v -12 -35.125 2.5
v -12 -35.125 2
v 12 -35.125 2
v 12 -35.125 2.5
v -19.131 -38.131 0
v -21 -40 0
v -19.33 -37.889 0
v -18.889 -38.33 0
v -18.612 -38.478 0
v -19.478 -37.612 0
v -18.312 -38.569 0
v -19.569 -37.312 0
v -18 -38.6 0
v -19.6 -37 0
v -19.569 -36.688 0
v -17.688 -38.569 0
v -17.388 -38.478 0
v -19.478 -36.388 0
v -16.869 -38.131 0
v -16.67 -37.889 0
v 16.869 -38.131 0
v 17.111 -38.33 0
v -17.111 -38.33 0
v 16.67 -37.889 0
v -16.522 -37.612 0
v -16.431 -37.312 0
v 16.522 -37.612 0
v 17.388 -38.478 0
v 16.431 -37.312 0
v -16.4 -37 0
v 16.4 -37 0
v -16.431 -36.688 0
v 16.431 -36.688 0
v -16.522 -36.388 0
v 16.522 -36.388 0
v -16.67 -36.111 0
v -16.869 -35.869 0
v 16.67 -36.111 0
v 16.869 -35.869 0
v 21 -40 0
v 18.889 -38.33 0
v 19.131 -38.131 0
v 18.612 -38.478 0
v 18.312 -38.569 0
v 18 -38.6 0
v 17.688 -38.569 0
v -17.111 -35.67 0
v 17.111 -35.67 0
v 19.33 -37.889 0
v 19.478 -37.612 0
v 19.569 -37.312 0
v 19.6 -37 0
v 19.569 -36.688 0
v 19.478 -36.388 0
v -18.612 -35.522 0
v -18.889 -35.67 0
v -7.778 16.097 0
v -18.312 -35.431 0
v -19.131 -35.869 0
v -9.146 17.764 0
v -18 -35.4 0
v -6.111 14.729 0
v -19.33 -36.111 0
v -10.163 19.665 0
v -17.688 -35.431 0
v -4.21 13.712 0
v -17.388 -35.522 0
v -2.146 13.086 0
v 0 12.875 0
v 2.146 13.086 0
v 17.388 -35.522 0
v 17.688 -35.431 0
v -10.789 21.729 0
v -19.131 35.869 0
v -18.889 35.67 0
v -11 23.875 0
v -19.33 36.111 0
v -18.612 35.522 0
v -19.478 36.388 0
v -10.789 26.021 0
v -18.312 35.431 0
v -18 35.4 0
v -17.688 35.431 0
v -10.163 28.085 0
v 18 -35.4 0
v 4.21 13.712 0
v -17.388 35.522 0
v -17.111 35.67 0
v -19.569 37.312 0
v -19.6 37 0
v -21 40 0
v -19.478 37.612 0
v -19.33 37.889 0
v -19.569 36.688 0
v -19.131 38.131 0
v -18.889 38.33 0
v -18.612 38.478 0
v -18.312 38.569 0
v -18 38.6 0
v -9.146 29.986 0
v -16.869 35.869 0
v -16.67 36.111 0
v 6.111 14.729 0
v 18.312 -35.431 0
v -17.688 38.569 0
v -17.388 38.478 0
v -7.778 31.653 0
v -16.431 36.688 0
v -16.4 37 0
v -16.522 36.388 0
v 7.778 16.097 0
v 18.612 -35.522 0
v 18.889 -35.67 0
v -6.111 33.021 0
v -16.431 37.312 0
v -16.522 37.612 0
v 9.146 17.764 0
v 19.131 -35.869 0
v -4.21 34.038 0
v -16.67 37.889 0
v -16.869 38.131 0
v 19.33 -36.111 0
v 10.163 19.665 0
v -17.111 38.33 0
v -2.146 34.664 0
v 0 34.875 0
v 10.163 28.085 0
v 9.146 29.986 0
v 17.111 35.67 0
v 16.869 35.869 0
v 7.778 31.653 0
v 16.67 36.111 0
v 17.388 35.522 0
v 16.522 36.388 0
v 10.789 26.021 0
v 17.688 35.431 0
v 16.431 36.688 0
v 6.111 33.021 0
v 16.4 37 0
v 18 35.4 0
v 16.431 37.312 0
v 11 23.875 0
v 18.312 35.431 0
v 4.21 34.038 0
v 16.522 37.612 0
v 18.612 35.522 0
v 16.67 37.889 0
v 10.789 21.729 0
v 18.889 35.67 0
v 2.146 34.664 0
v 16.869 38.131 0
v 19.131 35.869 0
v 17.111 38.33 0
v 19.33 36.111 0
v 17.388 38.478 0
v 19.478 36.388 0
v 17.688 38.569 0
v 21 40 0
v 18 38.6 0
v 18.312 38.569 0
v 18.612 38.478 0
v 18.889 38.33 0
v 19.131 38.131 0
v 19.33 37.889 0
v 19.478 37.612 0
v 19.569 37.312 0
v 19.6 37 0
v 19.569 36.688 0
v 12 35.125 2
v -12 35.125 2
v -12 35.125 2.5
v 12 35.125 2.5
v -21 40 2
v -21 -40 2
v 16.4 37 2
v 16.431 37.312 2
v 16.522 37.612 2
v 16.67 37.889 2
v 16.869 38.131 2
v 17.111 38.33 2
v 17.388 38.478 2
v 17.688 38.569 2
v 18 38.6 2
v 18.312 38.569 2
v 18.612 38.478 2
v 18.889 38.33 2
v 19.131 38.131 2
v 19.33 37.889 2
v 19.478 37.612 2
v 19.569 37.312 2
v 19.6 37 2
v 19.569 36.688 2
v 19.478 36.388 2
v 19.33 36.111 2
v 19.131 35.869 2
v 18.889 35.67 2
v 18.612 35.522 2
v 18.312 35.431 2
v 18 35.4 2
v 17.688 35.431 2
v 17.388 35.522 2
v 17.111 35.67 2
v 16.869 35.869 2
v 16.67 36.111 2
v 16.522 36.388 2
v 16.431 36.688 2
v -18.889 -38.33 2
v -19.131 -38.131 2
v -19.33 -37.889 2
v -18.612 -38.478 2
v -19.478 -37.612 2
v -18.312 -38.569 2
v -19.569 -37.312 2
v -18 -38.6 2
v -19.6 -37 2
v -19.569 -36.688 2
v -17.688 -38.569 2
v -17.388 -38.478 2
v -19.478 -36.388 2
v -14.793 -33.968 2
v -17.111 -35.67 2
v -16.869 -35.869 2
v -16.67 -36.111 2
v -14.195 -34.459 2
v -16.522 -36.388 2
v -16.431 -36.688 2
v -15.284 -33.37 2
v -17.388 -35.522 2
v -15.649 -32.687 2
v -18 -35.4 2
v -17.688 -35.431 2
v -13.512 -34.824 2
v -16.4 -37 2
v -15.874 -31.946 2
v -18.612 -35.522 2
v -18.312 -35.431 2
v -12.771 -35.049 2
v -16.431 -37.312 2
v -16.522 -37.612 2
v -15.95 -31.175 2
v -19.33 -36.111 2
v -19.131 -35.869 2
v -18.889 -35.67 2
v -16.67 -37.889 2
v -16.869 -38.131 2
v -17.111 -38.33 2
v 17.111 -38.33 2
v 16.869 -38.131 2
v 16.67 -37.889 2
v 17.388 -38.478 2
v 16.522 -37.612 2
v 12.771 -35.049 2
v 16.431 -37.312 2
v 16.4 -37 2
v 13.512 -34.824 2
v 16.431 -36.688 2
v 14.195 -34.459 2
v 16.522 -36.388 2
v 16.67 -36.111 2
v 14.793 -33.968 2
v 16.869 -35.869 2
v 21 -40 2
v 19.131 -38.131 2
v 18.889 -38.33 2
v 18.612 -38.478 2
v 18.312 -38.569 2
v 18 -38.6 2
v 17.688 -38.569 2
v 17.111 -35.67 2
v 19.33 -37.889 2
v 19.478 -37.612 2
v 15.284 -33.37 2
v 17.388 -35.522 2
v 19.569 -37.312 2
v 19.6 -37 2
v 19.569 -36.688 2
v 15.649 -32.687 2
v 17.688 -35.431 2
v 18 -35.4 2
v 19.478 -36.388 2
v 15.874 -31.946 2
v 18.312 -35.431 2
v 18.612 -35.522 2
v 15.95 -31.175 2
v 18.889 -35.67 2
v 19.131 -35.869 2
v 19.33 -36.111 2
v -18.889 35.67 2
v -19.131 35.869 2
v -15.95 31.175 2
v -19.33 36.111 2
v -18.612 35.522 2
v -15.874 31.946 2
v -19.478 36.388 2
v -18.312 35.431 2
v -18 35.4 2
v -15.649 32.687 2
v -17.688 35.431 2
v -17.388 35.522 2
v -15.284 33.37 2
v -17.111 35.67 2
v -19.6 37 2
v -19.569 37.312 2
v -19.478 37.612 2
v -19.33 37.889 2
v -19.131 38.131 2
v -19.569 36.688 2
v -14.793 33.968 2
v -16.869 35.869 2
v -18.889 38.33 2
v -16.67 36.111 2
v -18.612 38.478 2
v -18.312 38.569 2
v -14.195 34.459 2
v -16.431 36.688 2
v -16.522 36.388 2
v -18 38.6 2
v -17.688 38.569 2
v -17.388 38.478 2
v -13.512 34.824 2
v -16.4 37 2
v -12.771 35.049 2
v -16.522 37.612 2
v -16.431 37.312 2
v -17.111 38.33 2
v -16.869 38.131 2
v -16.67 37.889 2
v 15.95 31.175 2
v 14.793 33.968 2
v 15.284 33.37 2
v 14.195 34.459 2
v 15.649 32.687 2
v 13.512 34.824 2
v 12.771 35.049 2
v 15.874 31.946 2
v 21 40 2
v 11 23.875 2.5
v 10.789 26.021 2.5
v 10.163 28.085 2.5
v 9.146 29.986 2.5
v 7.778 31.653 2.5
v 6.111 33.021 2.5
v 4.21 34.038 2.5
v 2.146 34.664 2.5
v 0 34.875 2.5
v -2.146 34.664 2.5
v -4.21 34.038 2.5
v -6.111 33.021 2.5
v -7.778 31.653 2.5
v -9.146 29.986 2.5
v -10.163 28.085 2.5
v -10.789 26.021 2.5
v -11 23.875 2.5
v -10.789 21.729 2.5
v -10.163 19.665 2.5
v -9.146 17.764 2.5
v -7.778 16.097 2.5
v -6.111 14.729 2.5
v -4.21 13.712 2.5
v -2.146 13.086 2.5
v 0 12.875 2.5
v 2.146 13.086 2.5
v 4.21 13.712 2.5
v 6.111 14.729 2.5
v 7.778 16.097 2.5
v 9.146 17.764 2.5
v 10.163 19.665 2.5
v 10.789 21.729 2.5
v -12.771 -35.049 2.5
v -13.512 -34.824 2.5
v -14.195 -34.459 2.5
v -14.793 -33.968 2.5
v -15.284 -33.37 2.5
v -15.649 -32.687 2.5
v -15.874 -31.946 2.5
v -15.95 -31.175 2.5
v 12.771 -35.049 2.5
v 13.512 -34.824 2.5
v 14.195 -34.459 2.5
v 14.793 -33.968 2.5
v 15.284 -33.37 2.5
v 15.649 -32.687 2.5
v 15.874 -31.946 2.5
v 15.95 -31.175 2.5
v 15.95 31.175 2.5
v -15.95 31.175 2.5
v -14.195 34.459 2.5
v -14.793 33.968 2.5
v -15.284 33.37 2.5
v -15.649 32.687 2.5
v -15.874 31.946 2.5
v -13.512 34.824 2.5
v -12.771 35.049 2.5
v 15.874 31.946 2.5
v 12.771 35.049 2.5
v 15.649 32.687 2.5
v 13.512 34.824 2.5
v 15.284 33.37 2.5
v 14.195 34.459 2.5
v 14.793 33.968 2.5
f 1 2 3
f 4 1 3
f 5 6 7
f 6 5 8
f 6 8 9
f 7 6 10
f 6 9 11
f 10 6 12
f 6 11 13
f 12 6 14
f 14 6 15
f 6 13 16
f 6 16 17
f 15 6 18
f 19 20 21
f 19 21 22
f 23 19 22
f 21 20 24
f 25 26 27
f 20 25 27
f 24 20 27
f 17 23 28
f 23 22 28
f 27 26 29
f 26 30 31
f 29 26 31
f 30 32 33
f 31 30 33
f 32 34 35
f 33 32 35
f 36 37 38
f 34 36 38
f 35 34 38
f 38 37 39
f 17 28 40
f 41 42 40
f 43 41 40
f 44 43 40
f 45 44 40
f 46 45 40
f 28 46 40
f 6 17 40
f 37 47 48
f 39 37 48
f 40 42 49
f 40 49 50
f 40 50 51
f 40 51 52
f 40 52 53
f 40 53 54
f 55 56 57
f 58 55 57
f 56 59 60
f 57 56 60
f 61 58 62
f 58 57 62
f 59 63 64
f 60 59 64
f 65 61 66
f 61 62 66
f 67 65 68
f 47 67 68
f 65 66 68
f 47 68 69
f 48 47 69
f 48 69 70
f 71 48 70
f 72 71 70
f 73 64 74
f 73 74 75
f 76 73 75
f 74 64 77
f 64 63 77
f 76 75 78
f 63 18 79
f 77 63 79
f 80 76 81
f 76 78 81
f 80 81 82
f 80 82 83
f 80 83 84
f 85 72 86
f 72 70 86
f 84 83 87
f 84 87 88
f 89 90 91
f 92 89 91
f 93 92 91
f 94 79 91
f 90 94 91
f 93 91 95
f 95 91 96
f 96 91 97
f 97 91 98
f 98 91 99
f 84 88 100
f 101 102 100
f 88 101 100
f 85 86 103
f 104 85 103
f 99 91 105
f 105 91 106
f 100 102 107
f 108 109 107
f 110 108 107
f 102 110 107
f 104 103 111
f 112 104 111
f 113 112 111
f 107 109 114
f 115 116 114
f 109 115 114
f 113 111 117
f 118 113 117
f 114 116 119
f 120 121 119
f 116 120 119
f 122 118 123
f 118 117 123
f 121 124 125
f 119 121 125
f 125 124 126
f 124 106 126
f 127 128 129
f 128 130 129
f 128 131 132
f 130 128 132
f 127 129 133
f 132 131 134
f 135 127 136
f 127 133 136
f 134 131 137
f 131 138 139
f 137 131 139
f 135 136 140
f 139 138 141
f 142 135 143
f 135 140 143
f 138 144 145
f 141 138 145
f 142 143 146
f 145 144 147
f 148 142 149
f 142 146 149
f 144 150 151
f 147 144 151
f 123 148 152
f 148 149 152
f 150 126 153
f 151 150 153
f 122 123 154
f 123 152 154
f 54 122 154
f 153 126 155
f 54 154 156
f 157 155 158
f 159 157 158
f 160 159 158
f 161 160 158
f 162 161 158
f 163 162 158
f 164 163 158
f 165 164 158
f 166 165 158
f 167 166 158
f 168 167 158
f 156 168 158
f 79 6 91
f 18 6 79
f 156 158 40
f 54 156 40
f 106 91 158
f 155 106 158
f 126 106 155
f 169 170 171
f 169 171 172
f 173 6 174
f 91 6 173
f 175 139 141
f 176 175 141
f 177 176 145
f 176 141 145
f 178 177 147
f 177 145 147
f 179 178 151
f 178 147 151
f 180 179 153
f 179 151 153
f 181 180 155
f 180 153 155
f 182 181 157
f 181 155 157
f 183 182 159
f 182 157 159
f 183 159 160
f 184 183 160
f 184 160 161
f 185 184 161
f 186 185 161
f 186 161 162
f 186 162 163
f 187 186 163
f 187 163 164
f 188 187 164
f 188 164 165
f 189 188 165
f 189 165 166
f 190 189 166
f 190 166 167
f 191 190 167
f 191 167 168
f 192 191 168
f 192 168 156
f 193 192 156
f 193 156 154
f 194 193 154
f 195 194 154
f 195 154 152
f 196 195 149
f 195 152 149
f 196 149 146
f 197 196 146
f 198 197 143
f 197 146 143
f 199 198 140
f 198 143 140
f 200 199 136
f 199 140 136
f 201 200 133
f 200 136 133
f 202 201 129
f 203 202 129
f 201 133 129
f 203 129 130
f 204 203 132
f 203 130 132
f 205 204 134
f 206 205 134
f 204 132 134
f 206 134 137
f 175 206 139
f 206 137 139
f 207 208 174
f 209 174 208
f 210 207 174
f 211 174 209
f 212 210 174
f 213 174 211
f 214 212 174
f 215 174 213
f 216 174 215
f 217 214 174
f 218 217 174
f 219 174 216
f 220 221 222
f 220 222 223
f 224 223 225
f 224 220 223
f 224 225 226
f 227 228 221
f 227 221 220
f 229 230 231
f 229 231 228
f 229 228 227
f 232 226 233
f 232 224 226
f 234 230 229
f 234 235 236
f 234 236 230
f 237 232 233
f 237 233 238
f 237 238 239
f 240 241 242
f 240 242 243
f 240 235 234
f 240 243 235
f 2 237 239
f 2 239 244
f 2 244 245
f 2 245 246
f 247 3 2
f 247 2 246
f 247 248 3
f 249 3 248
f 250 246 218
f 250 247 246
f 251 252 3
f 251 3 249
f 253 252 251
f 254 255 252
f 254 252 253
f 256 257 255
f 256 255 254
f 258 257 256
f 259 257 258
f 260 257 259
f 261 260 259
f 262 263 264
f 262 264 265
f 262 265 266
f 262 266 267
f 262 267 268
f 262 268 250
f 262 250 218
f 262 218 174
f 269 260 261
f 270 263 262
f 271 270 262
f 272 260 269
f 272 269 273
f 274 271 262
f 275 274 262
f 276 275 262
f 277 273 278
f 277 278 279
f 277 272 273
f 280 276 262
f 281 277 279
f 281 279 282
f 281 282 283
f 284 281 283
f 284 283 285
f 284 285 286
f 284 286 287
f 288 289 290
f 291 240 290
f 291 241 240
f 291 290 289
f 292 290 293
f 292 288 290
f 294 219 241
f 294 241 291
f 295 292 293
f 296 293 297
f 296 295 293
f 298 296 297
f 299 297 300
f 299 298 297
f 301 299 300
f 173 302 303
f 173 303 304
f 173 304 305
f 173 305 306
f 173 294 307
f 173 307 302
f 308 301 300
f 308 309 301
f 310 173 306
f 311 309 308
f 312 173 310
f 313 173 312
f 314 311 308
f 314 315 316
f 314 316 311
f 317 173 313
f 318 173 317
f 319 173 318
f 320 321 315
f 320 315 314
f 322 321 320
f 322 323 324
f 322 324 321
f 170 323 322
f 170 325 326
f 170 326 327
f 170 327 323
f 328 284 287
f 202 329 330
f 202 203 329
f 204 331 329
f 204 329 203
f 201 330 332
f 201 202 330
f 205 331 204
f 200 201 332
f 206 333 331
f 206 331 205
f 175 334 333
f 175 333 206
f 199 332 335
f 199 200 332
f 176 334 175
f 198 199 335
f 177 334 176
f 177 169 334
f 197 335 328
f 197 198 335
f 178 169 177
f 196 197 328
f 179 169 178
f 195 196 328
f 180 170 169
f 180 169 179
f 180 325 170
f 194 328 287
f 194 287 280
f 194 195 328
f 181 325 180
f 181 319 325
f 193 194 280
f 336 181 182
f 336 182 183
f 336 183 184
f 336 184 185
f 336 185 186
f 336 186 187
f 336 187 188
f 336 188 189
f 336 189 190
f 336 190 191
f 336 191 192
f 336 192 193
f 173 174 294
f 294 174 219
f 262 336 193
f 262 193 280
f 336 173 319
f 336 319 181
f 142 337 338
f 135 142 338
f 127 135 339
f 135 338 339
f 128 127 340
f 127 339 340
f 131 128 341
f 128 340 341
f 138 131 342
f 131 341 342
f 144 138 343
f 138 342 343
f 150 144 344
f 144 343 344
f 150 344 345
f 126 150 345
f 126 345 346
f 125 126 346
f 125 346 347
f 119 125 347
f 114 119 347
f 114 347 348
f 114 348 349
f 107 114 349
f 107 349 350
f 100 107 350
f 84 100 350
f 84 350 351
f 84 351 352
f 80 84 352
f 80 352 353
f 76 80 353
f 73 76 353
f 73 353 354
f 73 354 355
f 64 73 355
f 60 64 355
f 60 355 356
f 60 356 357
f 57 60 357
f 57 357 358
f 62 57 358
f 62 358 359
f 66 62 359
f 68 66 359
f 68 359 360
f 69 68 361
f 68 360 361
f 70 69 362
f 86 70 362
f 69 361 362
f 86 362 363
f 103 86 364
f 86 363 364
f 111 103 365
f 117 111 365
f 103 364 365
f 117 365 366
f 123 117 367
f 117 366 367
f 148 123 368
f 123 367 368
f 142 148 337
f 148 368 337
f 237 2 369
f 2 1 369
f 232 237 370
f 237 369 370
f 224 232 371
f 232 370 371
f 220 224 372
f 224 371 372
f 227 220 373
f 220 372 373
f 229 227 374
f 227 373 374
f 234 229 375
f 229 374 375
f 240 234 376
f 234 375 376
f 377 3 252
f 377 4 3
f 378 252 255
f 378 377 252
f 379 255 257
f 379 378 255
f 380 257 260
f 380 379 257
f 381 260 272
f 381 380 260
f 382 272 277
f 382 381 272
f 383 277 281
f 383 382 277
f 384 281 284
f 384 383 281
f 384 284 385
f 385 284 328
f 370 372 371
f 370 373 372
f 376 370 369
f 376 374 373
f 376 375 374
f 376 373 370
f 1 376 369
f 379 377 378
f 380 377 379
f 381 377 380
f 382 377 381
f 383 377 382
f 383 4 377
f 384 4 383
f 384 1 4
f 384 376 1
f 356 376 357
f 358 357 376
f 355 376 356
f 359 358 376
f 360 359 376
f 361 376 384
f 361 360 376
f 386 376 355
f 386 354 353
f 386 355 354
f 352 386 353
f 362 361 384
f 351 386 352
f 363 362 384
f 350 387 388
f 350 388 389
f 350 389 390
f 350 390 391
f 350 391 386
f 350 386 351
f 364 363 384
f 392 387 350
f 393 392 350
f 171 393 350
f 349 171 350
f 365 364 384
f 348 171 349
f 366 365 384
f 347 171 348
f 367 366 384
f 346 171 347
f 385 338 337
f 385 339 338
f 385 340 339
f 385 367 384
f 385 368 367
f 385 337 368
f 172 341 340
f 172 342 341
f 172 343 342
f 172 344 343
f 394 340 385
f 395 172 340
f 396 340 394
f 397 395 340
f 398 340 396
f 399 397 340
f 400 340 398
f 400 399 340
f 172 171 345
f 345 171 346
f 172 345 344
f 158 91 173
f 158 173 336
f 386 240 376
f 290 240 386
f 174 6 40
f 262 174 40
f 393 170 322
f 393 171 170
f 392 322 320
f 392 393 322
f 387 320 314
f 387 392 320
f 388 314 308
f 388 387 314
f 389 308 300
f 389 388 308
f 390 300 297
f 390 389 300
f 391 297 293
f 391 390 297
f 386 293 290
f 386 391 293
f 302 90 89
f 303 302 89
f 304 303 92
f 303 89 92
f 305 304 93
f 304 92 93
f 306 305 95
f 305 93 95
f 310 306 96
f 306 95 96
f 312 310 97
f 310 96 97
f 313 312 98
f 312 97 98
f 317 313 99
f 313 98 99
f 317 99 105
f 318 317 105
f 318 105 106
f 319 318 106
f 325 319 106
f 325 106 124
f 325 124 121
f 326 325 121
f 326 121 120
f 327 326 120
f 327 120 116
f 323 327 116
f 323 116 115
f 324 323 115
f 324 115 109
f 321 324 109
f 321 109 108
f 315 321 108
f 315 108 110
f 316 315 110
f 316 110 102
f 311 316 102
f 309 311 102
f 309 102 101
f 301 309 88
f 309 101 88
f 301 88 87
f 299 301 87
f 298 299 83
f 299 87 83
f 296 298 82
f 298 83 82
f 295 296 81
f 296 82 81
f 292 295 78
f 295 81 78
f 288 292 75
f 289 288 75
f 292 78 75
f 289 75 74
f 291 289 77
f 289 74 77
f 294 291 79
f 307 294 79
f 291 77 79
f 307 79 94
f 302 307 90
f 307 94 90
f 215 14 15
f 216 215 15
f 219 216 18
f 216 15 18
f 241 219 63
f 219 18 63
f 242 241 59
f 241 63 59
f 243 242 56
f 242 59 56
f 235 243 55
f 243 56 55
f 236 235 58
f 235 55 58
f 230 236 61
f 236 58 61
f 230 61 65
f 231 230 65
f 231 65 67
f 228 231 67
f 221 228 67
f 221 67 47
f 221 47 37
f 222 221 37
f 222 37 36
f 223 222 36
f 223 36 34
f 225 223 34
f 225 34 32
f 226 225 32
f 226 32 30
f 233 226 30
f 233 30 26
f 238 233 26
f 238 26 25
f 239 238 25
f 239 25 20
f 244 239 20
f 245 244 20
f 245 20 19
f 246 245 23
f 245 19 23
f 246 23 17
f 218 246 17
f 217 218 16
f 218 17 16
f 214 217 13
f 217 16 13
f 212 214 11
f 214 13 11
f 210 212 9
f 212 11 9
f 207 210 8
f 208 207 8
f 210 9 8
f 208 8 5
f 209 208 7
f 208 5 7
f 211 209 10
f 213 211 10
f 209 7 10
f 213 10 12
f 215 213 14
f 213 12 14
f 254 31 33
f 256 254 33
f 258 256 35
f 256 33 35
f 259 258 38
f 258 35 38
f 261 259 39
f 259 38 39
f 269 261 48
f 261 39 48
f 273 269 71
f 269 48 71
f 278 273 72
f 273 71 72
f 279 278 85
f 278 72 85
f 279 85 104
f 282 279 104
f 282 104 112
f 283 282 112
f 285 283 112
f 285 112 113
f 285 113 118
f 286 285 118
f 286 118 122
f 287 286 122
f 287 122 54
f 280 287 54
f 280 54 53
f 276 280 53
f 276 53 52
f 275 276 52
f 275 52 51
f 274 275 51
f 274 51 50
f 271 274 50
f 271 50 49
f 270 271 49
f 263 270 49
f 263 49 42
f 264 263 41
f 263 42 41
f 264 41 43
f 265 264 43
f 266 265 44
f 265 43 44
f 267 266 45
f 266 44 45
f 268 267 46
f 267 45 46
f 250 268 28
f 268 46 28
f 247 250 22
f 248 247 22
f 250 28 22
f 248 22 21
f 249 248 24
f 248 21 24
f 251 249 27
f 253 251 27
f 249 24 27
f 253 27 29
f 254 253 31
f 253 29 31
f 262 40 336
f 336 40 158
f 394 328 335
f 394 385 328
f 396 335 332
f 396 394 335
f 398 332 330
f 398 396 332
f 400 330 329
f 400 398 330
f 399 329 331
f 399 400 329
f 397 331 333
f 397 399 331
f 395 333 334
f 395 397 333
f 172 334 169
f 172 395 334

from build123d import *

# Parameters (mm, degrees)
SKETCH2_W           = 42
SKETCH2_H           = 80
BOSS_EXTRUDE1_DEPTH = 2
SKETCH5_W           = 31.9
SKETCH5_H           = 70.25
BOSS_EXTRUDE2_DEPTH = 0.5
FILLET1_R           = 3.95
SKETCH7_R           = 11
CUT_EXTRUDE1_DEPTH  = 46.24654683
SKETCH8_R           = 1.6
CUT_EXTRUDE2_DEPTH  = 46.24654683


with BuildPart() as part:
    # Sketch2 → Boss-Extrude1 (new body)
    with BuildSketch(Plane.XY):
        Rectangle(SKETCH2_W, SKETCH2_H)
    extrude(amount=BOSS_EXTRUDE1_DEPTH)

    # Sketch5 → Boss-Extrude2 (add)
    with BuildSketch(Plane.XY.offset(2)):
        Rectangle(SKETCH5_W, SKETCH5_H)
    extrude(amount=BOSS_EXTRUDE2_DEPTH)

    # Fillet1
    fillet1_edges = [part.edges().sort_by_distance(p)[0] for p in [
        (15.95, -35.125, 2.25),
        (15.95, 35.125, 2.25),
        (-15.95, 35.125, 2.25),
        (-15.95, -35.125, 2.25),
    ]]
    fillet(fillet1_edges, radius=FILLET1_R)

    # Sketch7 → Cut-Extrude1 (cut, through all)
    with BuildSketch(Plane.XY.offset(2.5)):
        with Locations((0, 23.875)):
            Circle(SKETCH7_R)
    extrude(amount=-CUT_EXTRUDE1_DEPTH, mode=Mode.SUBTRACT)

    # Sketch8 → Cut-Extrude2 (cut, through all)
    with BuildSketch(Plane(origin=(0, 0, 0), x_dir=(-1, 0, 0), z_dir=(0, 0, -1))):
        with Locations((18, 37)):
            Circle(SKETCH8_R)
        with Locations((-18, 37)):
            Circle(SKETCH8_R)
        with Locations((-18, -37)):
            Circle(SKETCH8_R)
        with Locations((18, -37)):
            Circle(SKETCH8_R)
    extrude(amount=-CUT_EXTRUDE2_DEPTH, mode=Mode.SUBTRACT)


solid = part.part
